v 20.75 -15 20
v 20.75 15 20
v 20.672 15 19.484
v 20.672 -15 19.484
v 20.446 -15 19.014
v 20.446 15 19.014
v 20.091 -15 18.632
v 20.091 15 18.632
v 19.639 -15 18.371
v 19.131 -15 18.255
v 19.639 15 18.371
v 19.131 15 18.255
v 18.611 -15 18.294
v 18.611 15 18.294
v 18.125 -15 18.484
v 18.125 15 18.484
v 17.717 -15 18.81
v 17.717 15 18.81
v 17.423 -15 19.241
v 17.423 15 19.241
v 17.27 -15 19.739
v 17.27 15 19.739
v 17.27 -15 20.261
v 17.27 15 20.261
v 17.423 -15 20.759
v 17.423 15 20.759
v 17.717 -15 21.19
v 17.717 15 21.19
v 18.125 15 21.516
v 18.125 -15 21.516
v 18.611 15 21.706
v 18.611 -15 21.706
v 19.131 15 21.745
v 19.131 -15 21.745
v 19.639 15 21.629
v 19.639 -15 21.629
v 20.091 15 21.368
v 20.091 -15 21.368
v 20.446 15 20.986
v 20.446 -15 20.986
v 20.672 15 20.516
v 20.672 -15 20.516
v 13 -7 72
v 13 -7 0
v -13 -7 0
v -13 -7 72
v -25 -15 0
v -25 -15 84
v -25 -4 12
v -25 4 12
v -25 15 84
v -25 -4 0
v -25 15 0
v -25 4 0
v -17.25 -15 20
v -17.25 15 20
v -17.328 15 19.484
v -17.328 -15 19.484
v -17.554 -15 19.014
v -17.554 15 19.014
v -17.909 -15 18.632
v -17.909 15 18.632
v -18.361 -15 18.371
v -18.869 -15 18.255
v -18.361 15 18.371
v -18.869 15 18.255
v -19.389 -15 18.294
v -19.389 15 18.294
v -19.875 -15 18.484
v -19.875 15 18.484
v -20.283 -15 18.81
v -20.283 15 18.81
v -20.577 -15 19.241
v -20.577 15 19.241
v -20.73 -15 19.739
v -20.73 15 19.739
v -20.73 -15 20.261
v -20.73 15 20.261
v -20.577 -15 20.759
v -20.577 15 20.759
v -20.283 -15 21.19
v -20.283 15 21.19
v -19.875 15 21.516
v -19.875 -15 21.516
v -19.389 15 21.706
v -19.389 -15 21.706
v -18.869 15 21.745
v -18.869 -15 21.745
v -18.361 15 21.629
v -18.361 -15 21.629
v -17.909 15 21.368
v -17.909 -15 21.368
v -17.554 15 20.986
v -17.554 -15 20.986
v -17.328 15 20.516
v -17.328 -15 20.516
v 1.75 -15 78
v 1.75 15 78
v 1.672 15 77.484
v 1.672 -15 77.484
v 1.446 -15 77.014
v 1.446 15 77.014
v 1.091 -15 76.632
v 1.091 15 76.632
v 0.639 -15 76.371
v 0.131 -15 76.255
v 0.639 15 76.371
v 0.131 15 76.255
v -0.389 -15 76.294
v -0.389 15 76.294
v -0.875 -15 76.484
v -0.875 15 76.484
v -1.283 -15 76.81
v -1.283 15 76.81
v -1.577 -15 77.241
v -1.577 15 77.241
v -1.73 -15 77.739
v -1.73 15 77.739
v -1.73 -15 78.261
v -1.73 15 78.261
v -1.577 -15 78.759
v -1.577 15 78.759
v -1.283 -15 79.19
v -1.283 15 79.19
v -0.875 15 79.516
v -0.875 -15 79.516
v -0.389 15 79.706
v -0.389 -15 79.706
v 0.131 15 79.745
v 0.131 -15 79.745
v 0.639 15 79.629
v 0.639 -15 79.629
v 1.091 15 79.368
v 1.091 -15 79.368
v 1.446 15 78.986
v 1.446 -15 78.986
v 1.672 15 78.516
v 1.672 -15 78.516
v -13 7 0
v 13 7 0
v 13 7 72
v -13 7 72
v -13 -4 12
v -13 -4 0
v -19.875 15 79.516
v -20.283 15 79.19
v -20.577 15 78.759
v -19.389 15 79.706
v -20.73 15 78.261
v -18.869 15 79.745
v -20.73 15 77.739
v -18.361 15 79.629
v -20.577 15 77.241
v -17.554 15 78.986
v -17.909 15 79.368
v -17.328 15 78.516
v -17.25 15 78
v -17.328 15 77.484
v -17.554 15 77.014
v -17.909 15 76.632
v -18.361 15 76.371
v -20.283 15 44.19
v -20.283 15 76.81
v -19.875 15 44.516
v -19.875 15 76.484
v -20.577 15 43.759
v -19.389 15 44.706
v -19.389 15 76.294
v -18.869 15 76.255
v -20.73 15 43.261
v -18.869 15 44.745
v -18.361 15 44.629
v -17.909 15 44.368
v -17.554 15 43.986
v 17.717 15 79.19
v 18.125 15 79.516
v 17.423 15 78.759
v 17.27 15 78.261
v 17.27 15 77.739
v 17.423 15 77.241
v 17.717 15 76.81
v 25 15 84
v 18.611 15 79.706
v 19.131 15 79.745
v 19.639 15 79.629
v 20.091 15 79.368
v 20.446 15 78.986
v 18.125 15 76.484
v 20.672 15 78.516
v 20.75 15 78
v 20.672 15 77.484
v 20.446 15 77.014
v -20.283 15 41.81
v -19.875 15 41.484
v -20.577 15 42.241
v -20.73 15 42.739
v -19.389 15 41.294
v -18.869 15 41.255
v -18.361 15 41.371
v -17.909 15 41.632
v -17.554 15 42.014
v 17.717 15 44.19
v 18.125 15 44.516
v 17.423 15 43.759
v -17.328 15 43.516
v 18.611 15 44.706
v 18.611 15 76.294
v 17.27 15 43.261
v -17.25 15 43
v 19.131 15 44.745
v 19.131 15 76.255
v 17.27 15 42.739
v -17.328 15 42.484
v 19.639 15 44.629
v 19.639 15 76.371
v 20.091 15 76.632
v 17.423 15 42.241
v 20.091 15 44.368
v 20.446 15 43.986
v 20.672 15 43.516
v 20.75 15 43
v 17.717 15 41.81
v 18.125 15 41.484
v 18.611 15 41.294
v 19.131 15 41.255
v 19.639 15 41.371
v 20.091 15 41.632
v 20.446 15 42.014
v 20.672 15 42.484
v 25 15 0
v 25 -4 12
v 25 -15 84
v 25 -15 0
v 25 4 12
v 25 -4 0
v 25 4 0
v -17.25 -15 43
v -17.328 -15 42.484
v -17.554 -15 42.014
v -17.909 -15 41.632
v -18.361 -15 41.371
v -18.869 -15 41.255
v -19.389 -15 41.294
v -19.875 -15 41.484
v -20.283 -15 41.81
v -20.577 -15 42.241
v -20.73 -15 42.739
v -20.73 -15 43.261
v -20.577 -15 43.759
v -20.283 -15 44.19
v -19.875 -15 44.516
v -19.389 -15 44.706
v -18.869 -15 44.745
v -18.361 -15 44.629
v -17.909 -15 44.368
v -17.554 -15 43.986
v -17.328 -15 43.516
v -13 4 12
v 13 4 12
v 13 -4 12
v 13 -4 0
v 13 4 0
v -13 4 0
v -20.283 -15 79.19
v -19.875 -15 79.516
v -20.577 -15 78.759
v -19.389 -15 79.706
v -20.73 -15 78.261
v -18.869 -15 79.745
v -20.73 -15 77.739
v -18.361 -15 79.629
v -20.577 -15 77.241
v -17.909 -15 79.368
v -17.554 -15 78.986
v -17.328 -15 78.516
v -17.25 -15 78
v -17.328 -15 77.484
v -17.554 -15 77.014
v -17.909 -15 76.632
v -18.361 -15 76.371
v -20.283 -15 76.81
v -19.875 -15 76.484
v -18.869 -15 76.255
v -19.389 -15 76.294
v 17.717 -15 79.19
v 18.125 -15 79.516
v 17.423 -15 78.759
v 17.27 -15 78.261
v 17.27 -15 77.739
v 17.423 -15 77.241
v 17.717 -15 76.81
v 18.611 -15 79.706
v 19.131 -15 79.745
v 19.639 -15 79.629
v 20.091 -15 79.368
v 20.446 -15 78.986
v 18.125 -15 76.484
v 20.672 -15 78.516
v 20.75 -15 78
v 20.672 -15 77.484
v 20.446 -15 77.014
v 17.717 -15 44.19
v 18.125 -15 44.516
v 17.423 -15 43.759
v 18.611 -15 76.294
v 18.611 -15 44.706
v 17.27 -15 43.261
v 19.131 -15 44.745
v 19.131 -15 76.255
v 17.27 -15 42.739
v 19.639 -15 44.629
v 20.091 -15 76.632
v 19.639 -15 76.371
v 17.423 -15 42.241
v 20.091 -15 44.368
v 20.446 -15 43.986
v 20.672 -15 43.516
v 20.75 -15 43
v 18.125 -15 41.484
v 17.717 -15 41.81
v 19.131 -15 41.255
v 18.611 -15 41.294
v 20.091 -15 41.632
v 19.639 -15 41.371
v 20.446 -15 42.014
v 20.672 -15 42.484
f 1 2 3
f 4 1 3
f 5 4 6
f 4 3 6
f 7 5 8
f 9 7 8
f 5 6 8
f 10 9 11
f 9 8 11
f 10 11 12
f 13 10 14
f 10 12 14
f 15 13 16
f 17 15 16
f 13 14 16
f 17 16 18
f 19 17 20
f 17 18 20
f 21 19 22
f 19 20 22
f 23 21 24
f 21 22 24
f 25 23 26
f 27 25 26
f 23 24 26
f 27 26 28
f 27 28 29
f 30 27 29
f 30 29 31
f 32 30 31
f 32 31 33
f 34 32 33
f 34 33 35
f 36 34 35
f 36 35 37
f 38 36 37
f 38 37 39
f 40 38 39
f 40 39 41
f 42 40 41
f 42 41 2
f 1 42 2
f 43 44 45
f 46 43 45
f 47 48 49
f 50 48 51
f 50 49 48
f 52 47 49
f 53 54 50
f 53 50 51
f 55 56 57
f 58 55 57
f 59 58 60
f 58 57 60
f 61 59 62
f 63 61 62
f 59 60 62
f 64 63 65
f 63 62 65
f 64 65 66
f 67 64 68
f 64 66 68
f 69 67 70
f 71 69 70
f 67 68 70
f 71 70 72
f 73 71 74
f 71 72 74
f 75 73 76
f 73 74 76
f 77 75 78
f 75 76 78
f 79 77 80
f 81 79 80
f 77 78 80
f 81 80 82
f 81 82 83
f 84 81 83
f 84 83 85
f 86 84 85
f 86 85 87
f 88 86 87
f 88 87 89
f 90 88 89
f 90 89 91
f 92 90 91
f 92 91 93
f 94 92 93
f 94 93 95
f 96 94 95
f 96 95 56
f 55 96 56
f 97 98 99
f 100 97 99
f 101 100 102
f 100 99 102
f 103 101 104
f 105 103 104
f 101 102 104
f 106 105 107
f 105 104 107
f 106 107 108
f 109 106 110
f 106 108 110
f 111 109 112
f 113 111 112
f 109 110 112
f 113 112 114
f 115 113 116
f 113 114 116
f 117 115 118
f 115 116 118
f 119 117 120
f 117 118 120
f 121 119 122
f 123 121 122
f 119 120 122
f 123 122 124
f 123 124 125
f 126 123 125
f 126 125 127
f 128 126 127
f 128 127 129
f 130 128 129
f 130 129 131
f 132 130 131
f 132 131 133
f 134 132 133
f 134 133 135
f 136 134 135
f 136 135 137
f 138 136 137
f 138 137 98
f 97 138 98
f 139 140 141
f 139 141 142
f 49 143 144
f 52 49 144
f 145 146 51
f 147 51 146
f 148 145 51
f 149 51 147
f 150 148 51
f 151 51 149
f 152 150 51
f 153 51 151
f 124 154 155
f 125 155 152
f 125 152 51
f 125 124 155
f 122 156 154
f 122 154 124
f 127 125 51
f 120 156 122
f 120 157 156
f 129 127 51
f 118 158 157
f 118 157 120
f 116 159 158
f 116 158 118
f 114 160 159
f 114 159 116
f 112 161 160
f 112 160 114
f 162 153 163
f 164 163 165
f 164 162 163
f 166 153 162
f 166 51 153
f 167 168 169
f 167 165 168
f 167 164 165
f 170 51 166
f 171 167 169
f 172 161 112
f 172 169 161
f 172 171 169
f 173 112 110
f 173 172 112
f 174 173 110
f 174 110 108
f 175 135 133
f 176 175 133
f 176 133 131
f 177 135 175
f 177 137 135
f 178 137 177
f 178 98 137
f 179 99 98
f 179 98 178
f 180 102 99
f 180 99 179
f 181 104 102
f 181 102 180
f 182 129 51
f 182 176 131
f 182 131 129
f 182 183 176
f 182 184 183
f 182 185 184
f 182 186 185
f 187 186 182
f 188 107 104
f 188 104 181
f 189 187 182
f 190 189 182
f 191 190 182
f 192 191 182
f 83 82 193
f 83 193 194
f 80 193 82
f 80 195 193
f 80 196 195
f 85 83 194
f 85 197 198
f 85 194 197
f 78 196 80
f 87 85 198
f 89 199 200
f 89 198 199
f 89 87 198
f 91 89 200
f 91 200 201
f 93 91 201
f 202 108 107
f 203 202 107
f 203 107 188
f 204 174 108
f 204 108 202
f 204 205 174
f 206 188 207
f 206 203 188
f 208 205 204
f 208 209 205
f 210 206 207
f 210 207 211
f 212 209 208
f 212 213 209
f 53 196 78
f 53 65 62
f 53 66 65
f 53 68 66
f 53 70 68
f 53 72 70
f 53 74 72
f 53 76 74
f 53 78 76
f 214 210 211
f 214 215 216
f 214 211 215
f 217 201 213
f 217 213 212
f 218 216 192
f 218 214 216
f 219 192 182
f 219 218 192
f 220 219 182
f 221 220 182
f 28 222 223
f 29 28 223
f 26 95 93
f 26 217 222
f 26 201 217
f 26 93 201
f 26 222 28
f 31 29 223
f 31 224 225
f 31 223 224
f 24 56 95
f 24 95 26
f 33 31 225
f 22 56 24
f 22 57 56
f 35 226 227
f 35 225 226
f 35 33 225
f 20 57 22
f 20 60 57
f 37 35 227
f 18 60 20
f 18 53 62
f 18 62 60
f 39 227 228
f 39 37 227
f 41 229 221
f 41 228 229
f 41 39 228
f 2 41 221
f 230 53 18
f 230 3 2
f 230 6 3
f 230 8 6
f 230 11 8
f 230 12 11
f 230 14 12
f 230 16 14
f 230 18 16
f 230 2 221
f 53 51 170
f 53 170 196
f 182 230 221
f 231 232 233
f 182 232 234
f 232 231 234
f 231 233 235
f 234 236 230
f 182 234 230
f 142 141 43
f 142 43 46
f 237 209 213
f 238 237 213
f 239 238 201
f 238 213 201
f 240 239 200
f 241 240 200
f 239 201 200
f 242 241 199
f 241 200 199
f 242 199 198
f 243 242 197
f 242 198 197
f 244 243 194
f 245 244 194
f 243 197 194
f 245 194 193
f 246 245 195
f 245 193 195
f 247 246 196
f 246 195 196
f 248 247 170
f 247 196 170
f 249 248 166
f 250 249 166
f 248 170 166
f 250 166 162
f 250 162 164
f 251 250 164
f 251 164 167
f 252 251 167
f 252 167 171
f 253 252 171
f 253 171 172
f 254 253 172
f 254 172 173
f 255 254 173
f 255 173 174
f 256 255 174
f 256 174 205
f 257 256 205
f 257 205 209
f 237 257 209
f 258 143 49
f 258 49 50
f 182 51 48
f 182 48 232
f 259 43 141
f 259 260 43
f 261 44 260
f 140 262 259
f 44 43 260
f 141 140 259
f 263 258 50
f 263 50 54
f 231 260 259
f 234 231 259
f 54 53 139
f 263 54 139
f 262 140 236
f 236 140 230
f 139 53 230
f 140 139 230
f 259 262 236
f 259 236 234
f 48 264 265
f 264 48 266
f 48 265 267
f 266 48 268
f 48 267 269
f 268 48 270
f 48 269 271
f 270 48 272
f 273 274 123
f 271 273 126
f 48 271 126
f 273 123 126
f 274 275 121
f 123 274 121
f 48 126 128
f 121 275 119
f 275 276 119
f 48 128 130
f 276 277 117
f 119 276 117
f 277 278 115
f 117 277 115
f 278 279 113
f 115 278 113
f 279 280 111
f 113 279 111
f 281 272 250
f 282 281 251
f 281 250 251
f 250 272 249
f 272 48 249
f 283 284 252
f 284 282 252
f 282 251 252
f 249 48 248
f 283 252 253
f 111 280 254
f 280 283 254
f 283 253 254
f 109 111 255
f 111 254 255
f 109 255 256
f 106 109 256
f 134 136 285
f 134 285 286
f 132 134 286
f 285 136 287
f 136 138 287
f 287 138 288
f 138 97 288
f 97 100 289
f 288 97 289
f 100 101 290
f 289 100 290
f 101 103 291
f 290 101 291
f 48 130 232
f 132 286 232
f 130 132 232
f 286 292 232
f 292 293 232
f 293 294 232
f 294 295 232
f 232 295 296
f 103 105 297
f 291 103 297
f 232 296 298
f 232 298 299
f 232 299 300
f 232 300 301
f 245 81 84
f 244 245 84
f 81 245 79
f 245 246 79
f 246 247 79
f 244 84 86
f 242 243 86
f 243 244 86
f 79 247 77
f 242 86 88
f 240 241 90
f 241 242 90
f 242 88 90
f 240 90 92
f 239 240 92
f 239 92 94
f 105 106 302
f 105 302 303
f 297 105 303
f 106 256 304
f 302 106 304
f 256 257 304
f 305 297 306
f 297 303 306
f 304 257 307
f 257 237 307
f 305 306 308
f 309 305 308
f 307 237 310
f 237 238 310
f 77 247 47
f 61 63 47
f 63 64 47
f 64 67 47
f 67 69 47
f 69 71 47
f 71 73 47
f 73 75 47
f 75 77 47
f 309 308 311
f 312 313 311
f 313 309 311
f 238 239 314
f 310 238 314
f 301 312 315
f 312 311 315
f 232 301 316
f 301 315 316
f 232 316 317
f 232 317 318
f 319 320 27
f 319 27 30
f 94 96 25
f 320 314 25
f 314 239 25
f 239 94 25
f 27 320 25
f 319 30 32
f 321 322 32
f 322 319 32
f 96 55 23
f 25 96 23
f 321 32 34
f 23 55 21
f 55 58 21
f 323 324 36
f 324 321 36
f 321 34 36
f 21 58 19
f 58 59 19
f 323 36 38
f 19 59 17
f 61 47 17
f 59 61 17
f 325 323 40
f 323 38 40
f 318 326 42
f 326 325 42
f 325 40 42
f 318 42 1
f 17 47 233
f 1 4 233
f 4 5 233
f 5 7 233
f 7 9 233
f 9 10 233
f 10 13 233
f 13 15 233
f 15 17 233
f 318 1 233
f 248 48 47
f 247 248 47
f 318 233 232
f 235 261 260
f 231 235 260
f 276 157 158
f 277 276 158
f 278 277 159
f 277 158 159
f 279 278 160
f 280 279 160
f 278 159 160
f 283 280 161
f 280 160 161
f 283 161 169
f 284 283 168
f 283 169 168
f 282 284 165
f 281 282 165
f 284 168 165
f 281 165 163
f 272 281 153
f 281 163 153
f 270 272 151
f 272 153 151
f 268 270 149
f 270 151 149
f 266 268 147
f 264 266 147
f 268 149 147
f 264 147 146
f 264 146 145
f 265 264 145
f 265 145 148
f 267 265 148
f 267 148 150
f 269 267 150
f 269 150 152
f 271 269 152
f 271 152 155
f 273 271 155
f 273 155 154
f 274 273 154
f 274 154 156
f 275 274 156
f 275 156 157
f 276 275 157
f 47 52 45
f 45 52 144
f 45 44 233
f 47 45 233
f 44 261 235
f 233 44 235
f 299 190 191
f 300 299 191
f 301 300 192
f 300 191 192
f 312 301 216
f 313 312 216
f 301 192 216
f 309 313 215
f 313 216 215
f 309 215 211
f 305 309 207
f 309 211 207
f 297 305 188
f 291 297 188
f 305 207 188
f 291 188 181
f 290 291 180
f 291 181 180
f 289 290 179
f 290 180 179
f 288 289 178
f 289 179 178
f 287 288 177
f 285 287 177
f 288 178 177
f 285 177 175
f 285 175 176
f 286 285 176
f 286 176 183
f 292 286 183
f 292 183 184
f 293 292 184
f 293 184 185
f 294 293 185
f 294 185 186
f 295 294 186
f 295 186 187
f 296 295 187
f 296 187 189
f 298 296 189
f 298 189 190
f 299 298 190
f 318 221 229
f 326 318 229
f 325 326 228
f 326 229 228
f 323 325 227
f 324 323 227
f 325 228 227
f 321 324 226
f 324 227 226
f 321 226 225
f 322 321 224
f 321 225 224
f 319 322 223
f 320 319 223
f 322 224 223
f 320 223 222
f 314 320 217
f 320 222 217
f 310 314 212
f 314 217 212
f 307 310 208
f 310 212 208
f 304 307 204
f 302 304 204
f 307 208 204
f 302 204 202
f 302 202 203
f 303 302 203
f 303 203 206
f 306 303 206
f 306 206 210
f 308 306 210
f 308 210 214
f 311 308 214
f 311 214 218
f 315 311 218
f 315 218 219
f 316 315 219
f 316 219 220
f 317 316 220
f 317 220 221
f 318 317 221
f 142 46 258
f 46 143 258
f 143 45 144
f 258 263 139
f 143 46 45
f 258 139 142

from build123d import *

# Parameters (mm, degrees)
SKETCH_1_W          = 50
SKETCH_1_H          = 30
EXTRUDE_1_DEPTH     = 84
SKETCH_2_W          = 26
SKETCH_2_H          = 14
CUT_EXTRUDE_1_DEPTH = 72
SKETCH_5_W          = 12
SKETCH_5_H          = 8
CUT_EXTRUDE_4_DEPTH = 13
SKETCH_6_W          = 12
SKETCH_6_H          = 8
CUT_EXTRUDE_5_DEPTH = 13
SKETCH_7_R          = 1.75
CUT_EXTRUDE_7_DEPTH = 31


with BuildPart() as part:
    # ｽｹｯﾁ1 → ﾎﾞｽ - 押し出し1 (new body)
    with BuildSketch(Plane.XY):
        Rectangle(SKETCH_1_W, SKETCH_1_H)
    extrude(amount=EXTRUDE_1_DEPTH)

    # ｽｹｯﾁ2 → ｶｯﾄ - 押し出し1 (cut)
    with BuildSketch(Plane(origin=(0, 0, 0), x_dir=(-1, 0, 0), z_dir=(0, 0, -1))):
        Rectangle(SKETCH_2_W, SKETCH_2_H)
    extrude(amount=-CUT_EXTRUDE_1_DEPTH, mode=Mode.SUBTRACT)

    # ｽｹｯﾁ5 → ｶｯﾄ - 押し出し4 (cut, through all)
    with BuildSketch(Plane.ZY.offset(-13)):
        with Locations((6, 0)):
            Rectangle(SKETCH_5_W, SKETCH_5_H)
    extrude(amount=-CUT_EXTRUDE_4_DEPTH, mode=Mode.SUBTRACT)

    # ｽｹｯﾁ6 → ｶｯﾄ - 押し出し5 (cut, through all)
    with BuildSketch(Plane(origin=(-13, 0, 0), x_dir=(0, 0, -1), z_dir=(1, 0, 0))):
        with Locations((-6, 0)):
            Rectangle(SKETCH_6_W, SKETCH_6_H)
    extrude(amount=-CUT_EXTRUDE_5_DEPTH, mode=Mode.SUBTRACT)

    # ｽｹｯﾁ7 → ｶｯﾄ - 押し出し7 (cut, through all)
    with BuildSketch(Plane(origin=(0, 15, 0), x_dir=(1, 0, 0), z_dir=(0, 1, 0))):
        with Locations((19, -20)):
            Circle(SKETCH_7_R)
        with Locations((19, -43)):
            Circle(SKETCH_7_R)
        with Locations((19, -78)):
            Circle(SKETCH_7_R)
        with Locations((0, -78)):
            Circle(SKETCH_7_R)
        with Locations((-19, -78)):
            Circle(SKETCH_7_R)
        with Locations((-19, -43)):
            Circle(SKETCH_7_R)
        with Locations((-19, -20)):
            Circle(SKETCH_7_R)
    extrude(amount=-CUT_EXTRUDE_7_DEPTH, mode=Mode.SUBTRACT)


solid = part.part
